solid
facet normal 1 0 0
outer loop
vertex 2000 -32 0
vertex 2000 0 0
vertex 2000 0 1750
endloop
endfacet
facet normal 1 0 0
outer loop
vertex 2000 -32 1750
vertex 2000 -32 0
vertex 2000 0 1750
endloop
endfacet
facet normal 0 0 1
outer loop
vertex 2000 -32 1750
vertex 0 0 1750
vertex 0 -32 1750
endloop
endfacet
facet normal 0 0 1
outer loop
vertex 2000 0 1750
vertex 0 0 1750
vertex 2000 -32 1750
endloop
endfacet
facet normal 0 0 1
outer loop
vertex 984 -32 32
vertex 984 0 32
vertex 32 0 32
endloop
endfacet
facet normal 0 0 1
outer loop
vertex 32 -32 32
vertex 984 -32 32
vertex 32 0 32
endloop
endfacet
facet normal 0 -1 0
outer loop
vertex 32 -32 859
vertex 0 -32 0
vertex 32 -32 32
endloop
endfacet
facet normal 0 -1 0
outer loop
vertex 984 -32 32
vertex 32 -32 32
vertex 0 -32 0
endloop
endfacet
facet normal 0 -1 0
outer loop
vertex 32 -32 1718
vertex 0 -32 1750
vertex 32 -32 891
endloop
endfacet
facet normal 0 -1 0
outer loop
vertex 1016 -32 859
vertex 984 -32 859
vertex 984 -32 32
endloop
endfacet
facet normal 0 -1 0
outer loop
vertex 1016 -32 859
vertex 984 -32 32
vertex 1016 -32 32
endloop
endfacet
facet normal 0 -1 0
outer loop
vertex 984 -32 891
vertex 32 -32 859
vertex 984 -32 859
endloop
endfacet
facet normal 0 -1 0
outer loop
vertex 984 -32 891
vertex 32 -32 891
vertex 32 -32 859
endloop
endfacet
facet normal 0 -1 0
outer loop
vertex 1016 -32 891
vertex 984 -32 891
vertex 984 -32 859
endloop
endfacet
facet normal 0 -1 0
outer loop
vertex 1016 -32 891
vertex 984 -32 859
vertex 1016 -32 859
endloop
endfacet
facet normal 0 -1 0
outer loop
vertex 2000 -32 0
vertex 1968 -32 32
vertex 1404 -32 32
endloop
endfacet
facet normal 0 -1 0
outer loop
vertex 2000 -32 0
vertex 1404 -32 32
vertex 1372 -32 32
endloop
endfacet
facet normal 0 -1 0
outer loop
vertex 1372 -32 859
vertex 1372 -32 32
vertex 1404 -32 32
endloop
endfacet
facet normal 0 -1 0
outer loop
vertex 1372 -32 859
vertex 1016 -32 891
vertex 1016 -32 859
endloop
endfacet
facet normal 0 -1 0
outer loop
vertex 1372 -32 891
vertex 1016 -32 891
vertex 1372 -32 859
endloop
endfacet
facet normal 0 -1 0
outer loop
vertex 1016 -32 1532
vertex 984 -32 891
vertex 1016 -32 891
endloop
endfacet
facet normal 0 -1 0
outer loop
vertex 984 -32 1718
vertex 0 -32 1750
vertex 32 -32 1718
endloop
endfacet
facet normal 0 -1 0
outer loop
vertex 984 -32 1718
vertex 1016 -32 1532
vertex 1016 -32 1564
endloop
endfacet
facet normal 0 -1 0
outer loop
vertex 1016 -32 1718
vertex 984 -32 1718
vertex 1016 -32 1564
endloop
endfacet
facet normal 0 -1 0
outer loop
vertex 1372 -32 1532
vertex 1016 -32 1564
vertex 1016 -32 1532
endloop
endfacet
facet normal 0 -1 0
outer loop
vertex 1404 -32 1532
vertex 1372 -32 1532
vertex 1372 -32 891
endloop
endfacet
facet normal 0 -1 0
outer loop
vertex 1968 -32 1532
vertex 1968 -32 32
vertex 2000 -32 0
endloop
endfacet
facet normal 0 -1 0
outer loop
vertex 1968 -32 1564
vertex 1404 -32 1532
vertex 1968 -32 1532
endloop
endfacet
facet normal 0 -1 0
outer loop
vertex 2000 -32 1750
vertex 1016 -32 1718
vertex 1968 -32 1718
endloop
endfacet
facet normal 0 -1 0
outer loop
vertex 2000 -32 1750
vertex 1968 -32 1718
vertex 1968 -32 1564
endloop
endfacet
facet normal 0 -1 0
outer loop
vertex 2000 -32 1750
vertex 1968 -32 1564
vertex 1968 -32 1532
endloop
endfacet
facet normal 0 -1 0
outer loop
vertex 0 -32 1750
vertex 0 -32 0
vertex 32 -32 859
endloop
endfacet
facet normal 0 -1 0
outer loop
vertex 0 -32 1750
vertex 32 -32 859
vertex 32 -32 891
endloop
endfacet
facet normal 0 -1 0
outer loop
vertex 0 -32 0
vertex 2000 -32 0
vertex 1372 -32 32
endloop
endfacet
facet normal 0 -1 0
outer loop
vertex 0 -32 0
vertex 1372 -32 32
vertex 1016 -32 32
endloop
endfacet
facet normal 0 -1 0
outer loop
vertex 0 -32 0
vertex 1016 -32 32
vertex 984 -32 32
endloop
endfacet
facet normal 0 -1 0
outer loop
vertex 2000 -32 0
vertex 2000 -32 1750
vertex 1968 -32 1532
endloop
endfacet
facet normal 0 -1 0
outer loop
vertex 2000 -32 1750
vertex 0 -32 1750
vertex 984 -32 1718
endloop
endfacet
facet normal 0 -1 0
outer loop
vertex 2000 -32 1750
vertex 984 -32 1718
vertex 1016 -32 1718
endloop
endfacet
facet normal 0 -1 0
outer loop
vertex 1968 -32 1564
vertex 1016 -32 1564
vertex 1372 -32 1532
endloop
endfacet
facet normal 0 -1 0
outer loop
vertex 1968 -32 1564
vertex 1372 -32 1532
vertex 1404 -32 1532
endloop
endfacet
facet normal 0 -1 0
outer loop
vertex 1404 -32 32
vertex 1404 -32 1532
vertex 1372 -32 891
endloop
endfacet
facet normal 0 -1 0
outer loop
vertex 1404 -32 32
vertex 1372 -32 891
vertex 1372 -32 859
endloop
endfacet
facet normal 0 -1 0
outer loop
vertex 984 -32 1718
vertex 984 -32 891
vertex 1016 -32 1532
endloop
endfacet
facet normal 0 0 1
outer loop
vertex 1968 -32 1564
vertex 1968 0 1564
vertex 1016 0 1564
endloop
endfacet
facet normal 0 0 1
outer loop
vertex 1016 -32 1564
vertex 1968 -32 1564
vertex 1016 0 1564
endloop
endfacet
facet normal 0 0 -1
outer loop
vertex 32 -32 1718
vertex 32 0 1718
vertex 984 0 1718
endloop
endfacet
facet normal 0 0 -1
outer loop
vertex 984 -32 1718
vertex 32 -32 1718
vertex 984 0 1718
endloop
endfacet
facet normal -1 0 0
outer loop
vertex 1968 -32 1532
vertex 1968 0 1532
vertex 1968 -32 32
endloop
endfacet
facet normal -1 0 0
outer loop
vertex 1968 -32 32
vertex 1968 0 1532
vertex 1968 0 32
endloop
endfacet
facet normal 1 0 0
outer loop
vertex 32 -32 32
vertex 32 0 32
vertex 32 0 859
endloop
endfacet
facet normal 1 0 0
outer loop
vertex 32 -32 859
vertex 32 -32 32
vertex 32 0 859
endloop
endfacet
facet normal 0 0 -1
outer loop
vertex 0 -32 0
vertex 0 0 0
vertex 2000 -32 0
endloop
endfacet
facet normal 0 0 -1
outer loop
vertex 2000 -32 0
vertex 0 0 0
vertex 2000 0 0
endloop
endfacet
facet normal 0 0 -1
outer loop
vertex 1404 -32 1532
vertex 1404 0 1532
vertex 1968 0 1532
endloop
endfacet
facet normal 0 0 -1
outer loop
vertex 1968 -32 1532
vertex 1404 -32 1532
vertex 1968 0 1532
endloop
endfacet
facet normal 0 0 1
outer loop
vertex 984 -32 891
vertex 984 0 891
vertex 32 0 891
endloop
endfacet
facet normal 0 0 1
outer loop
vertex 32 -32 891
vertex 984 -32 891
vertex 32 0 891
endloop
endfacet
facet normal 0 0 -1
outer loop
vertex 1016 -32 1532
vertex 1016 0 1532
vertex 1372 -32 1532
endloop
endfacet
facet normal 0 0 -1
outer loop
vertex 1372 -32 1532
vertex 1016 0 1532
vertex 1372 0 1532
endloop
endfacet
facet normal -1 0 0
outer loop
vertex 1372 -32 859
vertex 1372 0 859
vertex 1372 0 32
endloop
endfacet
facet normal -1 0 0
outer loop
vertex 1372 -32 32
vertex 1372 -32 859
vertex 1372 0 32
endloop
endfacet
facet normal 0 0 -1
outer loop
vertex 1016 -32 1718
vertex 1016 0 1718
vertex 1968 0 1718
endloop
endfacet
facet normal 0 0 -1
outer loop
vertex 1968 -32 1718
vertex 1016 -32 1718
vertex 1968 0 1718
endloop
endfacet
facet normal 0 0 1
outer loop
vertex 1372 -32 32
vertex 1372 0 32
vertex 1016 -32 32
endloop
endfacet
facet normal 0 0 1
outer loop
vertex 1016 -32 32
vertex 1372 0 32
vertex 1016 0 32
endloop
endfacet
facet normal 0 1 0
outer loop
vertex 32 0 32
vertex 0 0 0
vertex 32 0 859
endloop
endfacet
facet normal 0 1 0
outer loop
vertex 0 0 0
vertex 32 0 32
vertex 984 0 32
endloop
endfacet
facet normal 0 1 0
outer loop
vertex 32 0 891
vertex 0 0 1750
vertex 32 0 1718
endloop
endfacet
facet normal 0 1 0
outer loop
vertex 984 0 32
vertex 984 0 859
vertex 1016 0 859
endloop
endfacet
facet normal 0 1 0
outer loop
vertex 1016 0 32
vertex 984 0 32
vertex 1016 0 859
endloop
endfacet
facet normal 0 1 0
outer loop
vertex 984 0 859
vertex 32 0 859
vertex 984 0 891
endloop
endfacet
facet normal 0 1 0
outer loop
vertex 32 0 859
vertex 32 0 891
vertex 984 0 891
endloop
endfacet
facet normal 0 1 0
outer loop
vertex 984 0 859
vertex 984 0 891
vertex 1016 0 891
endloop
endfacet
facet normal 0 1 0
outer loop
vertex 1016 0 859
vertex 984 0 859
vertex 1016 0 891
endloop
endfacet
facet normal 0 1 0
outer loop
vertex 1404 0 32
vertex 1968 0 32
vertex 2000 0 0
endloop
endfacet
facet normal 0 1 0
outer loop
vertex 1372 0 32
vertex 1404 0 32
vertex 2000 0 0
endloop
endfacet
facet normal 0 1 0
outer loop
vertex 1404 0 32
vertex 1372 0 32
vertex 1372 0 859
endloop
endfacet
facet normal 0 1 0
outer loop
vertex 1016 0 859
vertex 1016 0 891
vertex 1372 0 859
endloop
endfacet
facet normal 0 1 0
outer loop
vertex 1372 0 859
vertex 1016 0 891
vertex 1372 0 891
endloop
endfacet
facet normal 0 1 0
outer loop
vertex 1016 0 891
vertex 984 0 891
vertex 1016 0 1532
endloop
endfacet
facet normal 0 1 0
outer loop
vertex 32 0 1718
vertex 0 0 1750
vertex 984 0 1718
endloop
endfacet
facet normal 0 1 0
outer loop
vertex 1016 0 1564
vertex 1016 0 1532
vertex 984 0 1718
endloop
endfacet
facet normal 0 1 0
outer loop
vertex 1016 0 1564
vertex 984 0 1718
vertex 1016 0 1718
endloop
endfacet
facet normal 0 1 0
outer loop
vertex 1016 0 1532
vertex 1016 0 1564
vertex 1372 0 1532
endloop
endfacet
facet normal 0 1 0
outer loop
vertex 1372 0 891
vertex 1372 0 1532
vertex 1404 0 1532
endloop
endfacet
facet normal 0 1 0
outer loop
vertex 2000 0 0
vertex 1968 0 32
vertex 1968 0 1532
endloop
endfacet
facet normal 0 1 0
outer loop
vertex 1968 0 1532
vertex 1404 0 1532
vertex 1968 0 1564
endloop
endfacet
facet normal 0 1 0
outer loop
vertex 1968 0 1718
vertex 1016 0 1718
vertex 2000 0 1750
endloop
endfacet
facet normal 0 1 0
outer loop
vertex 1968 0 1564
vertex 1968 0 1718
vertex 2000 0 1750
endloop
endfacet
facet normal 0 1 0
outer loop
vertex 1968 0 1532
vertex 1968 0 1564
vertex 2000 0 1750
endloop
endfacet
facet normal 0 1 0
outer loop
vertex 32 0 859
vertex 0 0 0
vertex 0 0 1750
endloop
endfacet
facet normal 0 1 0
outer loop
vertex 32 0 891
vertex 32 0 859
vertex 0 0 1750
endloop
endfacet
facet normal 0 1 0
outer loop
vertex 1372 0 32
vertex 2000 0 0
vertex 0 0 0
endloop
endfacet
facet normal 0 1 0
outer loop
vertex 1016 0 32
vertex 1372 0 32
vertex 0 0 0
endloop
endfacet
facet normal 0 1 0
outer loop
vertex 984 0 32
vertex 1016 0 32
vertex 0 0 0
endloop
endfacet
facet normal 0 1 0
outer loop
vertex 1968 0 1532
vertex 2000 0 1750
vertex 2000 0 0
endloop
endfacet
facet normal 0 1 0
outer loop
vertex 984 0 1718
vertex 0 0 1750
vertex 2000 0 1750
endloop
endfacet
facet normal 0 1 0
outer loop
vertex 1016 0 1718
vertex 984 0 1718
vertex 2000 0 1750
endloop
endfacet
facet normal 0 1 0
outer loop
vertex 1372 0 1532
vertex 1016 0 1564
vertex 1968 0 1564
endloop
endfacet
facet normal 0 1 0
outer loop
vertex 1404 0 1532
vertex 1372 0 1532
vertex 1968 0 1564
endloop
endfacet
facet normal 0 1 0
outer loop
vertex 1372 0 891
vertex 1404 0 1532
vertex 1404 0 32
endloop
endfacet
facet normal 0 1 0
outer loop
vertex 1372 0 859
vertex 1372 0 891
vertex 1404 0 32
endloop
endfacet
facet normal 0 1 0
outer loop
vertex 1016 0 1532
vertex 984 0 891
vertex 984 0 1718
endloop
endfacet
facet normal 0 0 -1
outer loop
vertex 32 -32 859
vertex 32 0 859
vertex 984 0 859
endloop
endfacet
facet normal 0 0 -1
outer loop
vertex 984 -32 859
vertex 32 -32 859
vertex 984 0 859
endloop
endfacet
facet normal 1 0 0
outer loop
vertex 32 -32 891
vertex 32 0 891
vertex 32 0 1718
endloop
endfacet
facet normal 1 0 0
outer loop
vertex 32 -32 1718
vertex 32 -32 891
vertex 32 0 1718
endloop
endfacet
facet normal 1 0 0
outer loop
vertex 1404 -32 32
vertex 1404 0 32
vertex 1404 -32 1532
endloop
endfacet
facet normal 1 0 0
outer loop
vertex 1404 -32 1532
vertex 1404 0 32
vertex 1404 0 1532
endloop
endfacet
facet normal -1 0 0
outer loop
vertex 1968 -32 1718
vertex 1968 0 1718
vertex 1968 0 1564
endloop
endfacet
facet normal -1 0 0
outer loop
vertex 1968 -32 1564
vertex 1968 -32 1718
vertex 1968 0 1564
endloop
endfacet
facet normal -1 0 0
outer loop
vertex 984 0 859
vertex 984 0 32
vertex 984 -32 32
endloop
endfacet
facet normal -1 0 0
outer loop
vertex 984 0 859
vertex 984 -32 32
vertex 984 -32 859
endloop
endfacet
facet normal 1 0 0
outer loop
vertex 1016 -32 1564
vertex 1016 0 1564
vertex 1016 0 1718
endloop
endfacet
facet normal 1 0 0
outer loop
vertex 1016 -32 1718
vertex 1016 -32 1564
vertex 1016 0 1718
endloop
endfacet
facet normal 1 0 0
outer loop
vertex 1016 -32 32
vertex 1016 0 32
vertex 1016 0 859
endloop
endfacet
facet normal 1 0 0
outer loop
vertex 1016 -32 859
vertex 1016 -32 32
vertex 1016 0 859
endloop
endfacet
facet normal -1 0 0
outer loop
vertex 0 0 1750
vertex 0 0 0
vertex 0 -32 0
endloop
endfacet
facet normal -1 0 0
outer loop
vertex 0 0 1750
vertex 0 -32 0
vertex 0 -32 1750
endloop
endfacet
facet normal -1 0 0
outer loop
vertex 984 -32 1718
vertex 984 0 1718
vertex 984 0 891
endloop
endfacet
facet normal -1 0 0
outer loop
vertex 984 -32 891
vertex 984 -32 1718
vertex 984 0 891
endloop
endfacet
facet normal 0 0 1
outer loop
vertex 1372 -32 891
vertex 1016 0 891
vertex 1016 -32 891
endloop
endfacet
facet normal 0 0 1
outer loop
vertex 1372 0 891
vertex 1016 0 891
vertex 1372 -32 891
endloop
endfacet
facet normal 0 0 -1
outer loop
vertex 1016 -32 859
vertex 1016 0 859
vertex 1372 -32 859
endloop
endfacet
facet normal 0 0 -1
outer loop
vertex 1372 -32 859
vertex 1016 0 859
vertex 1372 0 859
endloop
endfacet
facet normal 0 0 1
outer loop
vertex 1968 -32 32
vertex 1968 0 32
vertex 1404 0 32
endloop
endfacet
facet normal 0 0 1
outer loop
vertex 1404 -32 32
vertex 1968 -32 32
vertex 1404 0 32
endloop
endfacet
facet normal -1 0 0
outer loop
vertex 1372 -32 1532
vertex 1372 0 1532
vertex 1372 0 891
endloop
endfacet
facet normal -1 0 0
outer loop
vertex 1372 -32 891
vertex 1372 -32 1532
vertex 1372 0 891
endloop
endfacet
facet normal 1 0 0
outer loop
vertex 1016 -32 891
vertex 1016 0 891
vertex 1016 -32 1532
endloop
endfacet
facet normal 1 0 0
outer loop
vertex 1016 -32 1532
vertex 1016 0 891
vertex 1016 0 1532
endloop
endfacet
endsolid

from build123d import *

# Parameters (mm, degrees)
F0_W     = 2000
F0_H     = 1750
F0_W_2   = 952
F0_H_2   = 32
F0_W_3   = 32
F0_H_3   = 827
F0_W_4   = 356
F1_DEPTH = 32


# Not quite as in the source:
# - a feature names something its author has since deleted; it is built from what else it names


with BuildPart() as f1:
    # F0 (on Front) → F1 (new body)
    with BuildSketch(Plane.XZ):
        with Locations((1000, 875)):
            Rectangle(F0_W, F0_H)
        Polygon((984, 32), (32, 32), (32, 859), (32, 891), (32, 1718), (984, 1718), (1016, 1718), (1968, 1718), (1968, 1564), (1968, 1532), (1968, 891), (1968, 859), (1968, 32), (1404, 32), (1372, 32), (1016, 32), align=None, mode=Mode.SUBTRACT)
        with Locations((508, 875)):
            Rectangle(F0_W_2, F0_H_2)
        with Locations((1000, 445.5)):
            Rectangle(F0_W_3, F0_H_3)
        with Locations((1000, 875)):
            Rectangle(F0_W_3, F0_H_2)
        Polygon((984, 1718), (984, 891), (1016, 891), (1016, 1532), (1016, 1564), (1016, 1718), align=None)
        with Locations((1194, 875)):
            Rectangle(F0_W_4, F0_H_2)
        Polygon((1372, 859), (1372, 32), (1404, 32), (1404, 1532), (1372, 1532), (1372, 891), align=None)
        Polygon((1016, 1564), (1016, 1532), (1372, 1532), (1404, 1532), (1968, 1532), (1968, 1564), align=None)
    extrude(amount=F1_DEPTH)


solid = f1.part
